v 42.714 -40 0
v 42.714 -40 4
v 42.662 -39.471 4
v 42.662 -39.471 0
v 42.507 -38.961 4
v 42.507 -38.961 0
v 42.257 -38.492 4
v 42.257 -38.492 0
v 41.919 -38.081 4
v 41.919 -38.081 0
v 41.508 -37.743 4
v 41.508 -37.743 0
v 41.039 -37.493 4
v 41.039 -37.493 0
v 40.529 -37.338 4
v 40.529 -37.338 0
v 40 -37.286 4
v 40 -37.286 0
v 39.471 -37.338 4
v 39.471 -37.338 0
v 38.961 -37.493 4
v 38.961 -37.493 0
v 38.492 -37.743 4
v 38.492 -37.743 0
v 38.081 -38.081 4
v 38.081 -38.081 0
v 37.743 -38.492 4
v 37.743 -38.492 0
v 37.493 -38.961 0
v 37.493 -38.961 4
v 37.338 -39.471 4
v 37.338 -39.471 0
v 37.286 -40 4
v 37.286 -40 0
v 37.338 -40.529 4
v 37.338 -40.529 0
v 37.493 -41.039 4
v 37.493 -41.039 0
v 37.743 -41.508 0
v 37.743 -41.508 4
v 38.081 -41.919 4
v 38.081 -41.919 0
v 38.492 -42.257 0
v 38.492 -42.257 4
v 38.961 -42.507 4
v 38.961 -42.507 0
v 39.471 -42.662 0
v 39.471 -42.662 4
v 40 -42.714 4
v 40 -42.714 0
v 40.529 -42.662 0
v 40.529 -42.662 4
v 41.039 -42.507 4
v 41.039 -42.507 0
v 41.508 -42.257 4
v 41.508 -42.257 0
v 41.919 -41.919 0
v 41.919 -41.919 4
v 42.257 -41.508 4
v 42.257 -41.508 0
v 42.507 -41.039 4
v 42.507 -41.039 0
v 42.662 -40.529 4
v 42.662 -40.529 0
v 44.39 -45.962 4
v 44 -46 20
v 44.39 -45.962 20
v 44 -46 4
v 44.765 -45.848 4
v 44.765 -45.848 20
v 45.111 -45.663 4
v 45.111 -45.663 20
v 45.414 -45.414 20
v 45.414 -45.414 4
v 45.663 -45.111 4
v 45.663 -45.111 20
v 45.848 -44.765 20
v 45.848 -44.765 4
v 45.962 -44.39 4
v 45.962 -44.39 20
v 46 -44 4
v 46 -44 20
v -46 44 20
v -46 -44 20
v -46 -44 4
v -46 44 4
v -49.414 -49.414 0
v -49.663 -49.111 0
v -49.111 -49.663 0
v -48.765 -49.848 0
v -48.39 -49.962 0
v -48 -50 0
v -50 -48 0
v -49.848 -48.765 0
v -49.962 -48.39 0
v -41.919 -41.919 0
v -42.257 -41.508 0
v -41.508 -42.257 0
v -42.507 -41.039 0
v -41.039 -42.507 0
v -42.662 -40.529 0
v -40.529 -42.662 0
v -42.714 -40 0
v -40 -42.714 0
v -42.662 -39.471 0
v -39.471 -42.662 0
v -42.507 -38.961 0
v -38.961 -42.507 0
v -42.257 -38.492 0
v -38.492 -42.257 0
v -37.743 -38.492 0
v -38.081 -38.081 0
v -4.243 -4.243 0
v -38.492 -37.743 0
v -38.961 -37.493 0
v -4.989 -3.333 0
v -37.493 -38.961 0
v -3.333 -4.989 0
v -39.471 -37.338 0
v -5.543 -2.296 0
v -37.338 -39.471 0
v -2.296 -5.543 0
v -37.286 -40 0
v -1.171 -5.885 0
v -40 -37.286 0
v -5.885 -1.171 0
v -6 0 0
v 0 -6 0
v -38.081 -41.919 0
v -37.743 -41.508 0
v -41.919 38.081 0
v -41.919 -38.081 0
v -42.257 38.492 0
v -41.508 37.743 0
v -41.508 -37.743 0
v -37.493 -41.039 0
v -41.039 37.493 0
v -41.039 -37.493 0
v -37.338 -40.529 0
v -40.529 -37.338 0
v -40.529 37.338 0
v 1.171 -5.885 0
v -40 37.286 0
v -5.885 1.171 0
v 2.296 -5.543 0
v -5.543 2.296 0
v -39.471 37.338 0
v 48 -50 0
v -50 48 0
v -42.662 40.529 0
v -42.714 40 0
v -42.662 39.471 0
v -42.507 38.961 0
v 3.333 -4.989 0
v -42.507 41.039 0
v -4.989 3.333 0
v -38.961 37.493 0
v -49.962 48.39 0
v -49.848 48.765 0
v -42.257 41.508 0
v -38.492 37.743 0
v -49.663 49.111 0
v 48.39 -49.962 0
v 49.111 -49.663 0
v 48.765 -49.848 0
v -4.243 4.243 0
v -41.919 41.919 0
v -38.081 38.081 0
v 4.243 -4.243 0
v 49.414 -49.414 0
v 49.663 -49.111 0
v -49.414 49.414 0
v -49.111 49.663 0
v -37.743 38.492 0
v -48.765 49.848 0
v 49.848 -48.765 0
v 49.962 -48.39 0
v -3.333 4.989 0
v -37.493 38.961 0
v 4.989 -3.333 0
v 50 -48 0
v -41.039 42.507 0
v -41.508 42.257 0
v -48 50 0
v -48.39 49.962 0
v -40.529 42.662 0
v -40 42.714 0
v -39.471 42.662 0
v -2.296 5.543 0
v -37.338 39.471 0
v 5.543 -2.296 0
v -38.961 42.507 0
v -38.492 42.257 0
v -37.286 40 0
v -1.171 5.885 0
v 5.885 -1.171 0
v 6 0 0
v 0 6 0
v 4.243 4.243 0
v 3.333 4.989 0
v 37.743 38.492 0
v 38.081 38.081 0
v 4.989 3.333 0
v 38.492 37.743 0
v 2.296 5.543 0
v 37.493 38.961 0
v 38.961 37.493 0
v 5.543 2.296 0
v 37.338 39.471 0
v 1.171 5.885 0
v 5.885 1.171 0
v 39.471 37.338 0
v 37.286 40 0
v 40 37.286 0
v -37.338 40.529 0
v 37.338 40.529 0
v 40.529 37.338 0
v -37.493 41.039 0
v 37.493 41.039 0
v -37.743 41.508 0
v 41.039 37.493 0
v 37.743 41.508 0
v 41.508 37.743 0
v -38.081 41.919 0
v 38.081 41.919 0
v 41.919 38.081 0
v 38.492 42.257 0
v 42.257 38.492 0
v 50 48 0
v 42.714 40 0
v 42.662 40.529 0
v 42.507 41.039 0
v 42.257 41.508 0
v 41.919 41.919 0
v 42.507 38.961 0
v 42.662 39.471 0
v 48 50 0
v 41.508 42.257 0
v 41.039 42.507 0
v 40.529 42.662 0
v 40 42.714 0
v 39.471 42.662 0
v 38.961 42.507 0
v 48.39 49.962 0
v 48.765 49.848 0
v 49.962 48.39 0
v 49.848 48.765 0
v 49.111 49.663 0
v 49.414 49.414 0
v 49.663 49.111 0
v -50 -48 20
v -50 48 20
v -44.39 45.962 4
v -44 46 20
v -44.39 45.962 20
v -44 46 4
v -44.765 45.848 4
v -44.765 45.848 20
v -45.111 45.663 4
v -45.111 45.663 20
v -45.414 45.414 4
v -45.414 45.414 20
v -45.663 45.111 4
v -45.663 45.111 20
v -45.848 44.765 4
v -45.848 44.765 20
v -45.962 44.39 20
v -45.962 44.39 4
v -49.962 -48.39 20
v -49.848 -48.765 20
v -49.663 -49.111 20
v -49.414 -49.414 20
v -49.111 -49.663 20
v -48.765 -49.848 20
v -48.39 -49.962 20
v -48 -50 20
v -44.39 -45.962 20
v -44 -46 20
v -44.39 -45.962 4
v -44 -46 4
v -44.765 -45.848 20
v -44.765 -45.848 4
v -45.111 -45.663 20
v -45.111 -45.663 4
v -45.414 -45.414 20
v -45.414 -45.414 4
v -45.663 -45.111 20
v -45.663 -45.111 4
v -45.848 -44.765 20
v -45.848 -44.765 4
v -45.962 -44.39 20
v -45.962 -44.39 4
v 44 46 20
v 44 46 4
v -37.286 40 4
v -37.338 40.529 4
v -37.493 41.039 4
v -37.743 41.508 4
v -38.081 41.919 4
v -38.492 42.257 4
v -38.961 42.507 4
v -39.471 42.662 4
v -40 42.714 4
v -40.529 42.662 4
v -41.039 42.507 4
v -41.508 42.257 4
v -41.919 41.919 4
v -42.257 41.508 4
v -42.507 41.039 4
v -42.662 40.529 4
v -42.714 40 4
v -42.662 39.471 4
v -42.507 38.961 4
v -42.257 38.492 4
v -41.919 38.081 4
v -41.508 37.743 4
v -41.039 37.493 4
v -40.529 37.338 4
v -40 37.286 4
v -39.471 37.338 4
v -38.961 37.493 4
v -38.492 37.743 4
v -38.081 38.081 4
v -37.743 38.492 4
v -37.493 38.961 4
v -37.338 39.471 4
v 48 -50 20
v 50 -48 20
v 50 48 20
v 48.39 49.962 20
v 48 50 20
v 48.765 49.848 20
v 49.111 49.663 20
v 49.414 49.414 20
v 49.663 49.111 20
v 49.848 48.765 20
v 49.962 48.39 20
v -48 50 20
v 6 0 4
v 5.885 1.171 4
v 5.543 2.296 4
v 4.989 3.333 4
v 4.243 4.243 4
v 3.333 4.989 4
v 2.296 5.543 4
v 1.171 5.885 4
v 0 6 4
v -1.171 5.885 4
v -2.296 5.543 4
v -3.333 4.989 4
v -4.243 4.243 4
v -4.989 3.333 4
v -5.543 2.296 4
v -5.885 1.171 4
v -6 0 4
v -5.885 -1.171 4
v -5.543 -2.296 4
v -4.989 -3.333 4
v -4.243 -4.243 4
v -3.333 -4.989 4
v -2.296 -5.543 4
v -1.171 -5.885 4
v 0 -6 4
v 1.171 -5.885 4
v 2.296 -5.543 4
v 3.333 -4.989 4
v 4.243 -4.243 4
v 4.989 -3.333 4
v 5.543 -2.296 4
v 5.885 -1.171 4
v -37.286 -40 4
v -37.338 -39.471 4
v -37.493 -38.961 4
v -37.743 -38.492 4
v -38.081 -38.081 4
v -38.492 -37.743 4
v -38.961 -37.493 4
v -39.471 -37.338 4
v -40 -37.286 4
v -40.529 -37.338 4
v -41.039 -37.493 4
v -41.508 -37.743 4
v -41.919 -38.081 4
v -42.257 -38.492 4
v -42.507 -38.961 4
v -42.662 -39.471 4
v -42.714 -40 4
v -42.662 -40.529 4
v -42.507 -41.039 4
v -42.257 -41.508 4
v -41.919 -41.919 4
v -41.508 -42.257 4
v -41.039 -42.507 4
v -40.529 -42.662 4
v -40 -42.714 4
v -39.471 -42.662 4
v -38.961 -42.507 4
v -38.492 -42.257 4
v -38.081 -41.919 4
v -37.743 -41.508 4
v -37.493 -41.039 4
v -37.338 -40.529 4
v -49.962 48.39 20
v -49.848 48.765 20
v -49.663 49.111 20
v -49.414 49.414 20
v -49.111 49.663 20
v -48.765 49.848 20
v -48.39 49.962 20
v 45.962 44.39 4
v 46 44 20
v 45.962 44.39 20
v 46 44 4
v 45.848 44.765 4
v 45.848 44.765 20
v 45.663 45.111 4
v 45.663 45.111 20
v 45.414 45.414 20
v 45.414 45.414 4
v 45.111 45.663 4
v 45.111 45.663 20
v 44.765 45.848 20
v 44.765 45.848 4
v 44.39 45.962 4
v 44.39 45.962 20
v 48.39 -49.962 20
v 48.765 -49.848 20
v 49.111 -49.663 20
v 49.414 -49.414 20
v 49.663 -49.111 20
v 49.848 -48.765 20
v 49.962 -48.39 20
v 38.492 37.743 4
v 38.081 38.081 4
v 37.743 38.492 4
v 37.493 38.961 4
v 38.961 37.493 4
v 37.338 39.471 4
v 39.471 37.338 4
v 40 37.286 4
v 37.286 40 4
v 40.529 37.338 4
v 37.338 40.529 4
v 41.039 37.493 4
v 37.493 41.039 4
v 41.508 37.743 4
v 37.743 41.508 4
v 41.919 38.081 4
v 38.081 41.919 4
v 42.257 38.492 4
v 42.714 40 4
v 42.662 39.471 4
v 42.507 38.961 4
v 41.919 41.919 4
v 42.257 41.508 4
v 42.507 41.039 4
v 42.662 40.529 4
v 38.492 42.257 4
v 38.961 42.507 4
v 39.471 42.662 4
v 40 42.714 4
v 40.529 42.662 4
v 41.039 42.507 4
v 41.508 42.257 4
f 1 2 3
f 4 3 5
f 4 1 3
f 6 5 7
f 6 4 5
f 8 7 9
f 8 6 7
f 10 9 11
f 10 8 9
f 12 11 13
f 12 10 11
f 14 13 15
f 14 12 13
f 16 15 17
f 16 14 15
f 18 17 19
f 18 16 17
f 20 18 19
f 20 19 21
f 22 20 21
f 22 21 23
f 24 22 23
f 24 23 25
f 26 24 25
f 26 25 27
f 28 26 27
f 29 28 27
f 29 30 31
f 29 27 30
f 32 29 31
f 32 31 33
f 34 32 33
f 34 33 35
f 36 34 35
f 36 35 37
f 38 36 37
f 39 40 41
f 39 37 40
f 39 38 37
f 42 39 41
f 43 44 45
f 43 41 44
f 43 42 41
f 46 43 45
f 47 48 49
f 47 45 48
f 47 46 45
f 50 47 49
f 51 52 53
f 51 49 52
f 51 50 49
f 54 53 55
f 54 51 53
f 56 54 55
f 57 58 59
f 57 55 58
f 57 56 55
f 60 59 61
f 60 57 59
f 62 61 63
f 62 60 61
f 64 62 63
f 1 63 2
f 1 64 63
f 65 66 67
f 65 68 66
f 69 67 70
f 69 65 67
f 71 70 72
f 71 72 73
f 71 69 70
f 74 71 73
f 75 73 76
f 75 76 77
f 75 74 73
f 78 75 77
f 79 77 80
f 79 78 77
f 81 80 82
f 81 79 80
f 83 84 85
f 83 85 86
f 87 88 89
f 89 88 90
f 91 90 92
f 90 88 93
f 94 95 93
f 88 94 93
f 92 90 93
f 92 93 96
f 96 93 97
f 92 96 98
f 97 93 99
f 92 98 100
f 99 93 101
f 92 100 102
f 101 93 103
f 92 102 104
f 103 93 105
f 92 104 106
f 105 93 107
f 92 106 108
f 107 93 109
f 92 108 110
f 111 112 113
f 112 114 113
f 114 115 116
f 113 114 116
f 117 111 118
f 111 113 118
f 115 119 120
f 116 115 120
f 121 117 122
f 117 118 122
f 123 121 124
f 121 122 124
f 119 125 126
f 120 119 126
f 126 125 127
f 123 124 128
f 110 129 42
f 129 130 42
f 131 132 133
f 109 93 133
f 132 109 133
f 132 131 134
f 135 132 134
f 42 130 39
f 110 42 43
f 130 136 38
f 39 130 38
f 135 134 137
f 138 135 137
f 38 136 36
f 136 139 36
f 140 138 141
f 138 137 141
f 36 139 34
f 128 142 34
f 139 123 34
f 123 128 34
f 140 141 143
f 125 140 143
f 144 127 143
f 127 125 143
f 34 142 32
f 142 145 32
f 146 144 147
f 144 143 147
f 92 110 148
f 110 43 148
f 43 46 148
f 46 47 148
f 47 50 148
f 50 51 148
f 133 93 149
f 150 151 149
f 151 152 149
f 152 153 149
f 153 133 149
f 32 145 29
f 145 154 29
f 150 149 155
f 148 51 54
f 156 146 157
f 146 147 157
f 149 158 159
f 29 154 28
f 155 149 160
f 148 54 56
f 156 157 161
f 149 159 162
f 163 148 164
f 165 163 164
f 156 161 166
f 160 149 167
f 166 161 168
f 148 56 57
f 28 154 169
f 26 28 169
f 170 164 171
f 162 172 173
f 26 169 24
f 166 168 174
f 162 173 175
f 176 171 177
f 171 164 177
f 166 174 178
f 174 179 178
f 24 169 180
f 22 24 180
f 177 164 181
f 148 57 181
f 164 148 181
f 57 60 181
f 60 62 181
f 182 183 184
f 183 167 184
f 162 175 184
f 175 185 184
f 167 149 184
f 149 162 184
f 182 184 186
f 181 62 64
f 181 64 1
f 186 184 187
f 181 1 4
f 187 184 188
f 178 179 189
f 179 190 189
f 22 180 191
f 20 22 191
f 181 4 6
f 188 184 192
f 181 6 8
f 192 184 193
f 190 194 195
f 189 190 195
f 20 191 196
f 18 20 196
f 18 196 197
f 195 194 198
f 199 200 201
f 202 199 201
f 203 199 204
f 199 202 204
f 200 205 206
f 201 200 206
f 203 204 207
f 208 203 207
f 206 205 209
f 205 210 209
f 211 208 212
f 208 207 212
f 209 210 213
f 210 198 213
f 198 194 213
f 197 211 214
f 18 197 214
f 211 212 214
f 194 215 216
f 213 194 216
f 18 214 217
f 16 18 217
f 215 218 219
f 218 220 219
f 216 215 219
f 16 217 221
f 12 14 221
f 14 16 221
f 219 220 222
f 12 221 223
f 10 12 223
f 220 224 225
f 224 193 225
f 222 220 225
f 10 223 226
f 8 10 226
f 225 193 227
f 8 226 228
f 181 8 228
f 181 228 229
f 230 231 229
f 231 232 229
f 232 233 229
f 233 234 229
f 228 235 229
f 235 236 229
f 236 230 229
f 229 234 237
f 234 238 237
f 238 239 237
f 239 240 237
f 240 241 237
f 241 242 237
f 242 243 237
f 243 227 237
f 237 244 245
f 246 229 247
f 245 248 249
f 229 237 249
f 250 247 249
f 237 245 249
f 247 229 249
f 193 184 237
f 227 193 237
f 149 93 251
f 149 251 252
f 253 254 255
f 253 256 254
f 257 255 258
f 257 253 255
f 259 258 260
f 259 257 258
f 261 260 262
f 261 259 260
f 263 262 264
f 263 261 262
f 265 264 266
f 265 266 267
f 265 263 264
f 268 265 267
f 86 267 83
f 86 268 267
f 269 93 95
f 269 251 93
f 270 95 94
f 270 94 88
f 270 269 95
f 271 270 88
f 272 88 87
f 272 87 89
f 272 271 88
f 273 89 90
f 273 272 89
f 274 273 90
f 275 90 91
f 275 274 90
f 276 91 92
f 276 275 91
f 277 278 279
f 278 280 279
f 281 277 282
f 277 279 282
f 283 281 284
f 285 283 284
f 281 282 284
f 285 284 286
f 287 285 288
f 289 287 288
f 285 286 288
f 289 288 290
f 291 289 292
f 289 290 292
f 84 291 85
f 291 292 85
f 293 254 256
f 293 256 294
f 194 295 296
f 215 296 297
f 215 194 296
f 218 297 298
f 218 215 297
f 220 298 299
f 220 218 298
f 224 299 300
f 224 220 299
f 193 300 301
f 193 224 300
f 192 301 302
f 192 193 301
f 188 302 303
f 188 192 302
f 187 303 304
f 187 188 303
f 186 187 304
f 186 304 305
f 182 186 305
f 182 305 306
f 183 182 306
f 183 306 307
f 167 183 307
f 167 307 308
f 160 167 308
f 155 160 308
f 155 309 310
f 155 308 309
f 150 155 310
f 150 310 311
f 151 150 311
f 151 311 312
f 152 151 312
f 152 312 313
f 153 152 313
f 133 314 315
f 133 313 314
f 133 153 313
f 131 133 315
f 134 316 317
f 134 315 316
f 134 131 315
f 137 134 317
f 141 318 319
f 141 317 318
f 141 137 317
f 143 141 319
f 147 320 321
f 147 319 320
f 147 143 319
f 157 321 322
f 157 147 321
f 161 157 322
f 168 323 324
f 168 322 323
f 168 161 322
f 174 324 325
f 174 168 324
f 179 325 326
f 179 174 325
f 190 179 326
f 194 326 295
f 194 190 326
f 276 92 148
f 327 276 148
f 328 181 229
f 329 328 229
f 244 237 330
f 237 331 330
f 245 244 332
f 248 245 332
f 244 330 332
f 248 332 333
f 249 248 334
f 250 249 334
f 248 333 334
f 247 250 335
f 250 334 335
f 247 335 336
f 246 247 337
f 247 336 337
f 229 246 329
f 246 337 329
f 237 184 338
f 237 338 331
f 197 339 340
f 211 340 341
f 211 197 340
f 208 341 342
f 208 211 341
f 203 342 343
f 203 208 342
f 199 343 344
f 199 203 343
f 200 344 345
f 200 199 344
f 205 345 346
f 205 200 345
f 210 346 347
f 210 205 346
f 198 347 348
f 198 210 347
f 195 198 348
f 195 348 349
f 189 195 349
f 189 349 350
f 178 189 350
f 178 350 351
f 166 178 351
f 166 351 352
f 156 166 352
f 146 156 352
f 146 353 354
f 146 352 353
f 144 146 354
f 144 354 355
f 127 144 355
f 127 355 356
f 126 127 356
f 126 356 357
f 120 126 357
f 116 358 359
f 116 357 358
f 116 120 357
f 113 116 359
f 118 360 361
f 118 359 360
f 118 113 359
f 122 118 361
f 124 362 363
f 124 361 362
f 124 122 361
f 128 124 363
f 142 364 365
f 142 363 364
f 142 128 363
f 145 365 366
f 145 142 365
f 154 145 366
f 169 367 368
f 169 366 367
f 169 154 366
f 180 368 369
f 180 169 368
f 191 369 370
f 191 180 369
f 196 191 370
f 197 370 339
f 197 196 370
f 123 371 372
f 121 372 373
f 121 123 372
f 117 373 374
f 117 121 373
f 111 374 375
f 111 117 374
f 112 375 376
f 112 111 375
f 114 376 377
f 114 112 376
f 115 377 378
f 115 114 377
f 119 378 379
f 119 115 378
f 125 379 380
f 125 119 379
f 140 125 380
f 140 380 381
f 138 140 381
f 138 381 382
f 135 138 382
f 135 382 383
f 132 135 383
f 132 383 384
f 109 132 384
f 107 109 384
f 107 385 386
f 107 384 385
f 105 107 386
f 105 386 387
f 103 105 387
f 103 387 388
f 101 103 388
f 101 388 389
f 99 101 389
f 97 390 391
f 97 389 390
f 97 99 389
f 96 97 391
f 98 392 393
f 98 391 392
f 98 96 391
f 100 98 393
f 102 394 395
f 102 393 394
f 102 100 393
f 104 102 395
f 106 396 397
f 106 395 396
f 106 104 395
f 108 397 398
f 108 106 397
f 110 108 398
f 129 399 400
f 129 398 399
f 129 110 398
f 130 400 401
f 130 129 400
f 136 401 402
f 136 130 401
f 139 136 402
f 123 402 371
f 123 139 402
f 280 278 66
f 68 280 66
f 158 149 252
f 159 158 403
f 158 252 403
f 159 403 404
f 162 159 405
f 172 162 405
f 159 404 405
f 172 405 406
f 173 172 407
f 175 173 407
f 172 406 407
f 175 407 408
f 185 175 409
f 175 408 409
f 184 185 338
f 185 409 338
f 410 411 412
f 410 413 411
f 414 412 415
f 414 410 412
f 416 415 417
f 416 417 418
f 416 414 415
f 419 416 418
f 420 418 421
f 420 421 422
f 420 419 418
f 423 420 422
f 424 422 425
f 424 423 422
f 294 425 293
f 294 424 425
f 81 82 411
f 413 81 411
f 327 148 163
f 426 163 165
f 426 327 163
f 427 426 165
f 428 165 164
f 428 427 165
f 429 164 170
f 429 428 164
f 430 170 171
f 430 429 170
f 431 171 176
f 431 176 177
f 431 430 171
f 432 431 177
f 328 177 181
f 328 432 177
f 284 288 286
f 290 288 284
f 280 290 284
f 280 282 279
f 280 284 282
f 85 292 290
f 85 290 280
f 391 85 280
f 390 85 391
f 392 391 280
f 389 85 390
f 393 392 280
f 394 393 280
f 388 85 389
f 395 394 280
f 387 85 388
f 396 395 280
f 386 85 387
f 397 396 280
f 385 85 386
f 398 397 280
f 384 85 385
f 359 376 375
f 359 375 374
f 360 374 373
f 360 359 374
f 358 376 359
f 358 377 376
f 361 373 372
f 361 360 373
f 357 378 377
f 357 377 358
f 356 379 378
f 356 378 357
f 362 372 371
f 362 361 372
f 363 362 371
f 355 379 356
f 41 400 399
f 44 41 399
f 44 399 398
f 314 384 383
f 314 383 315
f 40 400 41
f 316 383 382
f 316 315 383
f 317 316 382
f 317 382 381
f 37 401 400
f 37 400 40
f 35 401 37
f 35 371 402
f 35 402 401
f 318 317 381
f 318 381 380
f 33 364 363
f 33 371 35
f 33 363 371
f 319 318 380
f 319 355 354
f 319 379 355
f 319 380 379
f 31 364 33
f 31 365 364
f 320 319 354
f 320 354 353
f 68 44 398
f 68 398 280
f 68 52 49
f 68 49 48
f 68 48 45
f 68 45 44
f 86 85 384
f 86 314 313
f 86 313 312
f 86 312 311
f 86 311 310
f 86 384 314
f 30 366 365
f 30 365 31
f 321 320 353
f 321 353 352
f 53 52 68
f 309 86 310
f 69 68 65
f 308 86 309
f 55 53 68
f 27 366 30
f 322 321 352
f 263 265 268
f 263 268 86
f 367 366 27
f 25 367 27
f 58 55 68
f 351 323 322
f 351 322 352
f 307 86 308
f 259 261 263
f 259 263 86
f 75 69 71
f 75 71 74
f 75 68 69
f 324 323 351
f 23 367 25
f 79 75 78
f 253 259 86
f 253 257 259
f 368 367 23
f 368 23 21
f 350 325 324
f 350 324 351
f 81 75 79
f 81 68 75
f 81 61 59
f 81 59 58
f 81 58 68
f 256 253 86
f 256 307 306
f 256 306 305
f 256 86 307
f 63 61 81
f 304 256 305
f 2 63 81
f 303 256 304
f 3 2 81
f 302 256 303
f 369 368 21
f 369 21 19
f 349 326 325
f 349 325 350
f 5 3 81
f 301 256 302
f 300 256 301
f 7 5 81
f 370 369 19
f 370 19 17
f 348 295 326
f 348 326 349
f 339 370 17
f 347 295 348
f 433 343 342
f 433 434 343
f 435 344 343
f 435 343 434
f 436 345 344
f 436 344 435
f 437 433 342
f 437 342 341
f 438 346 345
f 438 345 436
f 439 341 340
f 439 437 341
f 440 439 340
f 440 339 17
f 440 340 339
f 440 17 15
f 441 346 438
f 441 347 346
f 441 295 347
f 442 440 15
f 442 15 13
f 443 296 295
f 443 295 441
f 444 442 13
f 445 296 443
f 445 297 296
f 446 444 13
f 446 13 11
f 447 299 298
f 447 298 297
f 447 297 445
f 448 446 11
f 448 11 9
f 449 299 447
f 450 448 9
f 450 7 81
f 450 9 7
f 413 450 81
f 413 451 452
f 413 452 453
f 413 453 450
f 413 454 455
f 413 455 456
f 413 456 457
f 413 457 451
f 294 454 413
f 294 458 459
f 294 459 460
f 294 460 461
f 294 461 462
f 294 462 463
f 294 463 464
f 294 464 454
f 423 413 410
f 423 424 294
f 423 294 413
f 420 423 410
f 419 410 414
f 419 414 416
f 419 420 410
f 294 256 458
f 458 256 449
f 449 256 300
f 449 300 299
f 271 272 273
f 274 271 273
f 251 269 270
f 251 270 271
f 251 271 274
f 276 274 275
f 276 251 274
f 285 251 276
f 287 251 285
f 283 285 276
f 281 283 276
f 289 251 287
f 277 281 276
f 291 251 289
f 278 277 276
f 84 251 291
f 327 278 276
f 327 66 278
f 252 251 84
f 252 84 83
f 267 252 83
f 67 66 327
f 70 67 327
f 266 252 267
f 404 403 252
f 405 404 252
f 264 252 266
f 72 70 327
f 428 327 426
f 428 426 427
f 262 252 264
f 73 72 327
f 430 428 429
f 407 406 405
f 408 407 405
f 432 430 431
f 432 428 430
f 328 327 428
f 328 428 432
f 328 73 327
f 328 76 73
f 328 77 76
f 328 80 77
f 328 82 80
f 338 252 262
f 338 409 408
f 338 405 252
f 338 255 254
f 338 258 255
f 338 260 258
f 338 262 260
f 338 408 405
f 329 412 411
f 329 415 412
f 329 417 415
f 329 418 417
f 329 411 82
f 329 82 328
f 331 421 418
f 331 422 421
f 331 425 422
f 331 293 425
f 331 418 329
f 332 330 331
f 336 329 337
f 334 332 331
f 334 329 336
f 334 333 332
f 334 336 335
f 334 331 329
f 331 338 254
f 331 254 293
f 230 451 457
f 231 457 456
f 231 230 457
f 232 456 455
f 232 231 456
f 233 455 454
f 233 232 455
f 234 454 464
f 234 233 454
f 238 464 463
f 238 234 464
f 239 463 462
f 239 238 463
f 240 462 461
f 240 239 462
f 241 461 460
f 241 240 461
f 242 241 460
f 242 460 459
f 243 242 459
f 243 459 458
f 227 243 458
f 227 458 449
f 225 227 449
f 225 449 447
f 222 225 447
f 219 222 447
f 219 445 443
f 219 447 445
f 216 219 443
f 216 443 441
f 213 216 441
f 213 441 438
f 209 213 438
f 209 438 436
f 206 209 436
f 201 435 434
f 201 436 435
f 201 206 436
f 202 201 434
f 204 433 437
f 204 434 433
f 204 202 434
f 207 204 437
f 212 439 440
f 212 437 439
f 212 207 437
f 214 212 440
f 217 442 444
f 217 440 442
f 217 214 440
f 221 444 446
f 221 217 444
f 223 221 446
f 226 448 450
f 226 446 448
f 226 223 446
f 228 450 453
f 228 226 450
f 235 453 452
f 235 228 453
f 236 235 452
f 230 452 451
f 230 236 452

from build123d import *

# Parameters (mm, degrees)
SKETCH1_W           = 100
SKETCH1_H           = 100
BOSS_EXTRUDE1_DEPTH = 20
SKETCH2_W           = 92
SKETCH2_H           = 92
CUT_EXTRUDE1_DEPTH  = 16
FILLET1_R           = 2
SKETCH3_R           = 6
SKETCH3_R_2         = 2.713966801
CUT_EXTRUDE2_DEPTH  = 16


with BuildPart() as part:
    # Sketch1 → Boss-Extrude1 (new body)
    with BuildSketch(Plane.XY):
        Rectangle(SKETCH1_W, SKETCH1_H)
    extrude(amount=BOSS_EXTRUDE1_DEPTH)

    # Sketch2 → Cut-Extrude1 (cut)
    with BuildSketch(Plane.XY.offset(20)):
        Rectangle(SKETCH2_W, SKETCH2_H)
    extrude(amount=-CUT_EXTRUDE1_DEPTH, mode=Mode.SUBTRACT)

    # Fillet1
    fillet1_edges = [part.edges().sort_by_distance(p)[0] for p in [
        (-46, -46, 12),
        (-46, 46, 12),
        (46, 46, 12),
        (46, -46, 12),
        (-50, 50, 10),
        (50, 50, 10),
        (50, -50, 10),
        (-50, -50, 10),
    ]]
    fillet(fillet1_edges, radius=FILLET1_R)

    # Sketch3 → Cut-Extrude2 (cut)
    with BuildSketch(Plane.XY):
        Circle(SKETCH3_R)
        with Locations((-40, 40)):
            Circle(SKETCH3_R_2)
        with Locations((40, 40)):
            Circle(SKETCH3_R_2)
        with Locations((40, -40)):
            Circle(SKETCH3_R_2)
        with Locations((-40, -40)):
            Circle(SKETCH3_R_2)
    extrude(amount=CUT_EXTRUDE2_DEPTH, mode=Mode.SUBTRACT)


solid = part.part
